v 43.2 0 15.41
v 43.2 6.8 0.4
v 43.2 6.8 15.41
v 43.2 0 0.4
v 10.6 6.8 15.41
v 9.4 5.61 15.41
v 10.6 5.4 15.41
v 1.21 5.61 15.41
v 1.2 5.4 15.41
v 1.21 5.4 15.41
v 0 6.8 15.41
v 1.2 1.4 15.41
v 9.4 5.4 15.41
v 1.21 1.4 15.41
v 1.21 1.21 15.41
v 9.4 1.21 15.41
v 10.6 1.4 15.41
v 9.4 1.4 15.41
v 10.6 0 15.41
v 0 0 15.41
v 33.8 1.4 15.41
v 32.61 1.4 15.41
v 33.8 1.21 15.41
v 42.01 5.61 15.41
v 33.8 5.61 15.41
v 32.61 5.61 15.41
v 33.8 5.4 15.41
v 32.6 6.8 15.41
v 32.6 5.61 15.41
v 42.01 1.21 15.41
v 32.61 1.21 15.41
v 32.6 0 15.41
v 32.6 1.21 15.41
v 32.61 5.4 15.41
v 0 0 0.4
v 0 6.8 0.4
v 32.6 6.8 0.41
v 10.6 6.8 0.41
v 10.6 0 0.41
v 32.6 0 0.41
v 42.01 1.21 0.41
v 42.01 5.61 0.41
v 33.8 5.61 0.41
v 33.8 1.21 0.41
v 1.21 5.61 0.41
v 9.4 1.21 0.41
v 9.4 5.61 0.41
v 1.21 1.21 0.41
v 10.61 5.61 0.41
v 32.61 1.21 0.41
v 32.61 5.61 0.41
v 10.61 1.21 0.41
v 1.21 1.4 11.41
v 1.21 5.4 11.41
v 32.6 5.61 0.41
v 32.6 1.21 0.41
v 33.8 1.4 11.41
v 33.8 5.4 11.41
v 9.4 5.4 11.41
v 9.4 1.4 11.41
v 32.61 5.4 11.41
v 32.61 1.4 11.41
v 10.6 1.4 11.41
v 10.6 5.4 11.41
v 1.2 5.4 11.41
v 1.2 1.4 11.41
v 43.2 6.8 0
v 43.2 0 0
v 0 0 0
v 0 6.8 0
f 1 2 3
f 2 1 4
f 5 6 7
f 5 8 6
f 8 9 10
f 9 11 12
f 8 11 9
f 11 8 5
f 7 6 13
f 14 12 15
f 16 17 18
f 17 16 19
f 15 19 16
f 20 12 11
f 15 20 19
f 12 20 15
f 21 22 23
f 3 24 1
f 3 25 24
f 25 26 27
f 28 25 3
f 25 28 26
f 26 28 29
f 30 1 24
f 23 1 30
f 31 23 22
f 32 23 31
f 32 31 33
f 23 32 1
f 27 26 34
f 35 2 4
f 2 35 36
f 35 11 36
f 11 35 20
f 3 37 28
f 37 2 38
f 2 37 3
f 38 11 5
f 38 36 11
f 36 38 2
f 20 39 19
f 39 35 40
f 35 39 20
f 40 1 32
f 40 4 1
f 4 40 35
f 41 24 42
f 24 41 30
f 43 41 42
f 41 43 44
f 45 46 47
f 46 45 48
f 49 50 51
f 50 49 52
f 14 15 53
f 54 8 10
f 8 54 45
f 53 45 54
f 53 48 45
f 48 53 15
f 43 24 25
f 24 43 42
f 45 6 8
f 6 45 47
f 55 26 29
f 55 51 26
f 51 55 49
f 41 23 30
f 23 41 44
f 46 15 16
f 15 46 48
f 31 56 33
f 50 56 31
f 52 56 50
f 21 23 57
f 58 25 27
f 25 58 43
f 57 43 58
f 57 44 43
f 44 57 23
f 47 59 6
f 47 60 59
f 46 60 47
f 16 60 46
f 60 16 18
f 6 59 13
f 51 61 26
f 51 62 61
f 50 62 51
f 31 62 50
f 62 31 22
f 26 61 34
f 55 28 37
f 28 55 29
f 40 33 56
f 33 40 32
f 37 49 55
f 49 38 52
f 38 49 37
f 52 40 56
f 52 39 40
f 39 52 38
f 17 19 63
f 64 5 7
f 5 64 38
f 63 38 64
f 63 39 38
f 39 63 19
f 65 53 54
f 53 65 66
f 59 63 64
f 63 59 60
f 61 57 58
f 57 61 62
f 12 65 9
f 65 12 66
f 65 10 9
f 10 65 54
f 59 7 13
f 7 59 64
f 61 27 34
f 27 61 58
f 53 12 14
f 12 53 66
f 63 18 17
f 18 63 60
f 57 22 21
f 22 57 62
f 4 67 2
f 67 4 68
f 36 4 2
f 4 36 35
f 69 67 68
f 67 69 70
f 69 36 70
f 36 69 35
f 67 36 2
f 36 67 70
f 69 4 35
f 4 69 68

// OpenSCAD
// file: ../../Base/Rotation.scad
// Fischertechnik Box Foundation
// Geometry Helpers Rotation

include <PlacementOptions.scad>

// getRotatedSpace(space, rotation=NoRotation)
// Rotates the space dependent on the specified rotation

function getRotatedSpace(space, rotation=NoRotation) = [
    (rotation == Rotate90 || rotation == Rotate270) ? space.y : space.x,
    (rotation == Rotate90 || rotation == Rotate270) ? space.x : space.y
];

// Rotates the given space around the fixed left lower corner
// space = the space the children needs as width/depth list [width,depth]
// rotation = 0 Rotate0 degrees, 1 Rotate90 degrees, 2 Rotate180 degrees, 3 Rotate270 degrees (equivalent to -90)

module RotateFix(space, rotation=NoRotation) {
    dy = (rotation == Rotate0 || rotation == Rotate270) ? 0 :
        (rotation == Rotate90) ? space.x :
        space.y;
    dx = (rotation < Rotate180) ? 0 :
        (rotation == Rotate180) ? space.x :
        space.y;
    
    translate([dx, dy, 0])
        rotate([0, 0, rotations[rotation]])
            children();
}
// file: ../../Base/Alignment.scad
// Fischertechnik Box Foundation
// Geometry Helpers Alignment

include <PlacementOptions.scad>

// getAlignedX(elementWidth, spaceWidth, align=AlignRight, offset=0)
// Gets the aligned X offset of an element with the given
// width in the given space.
// elementWidth = The width of the element to positon
// spaceWidth = The space where the element should be aligned
// align = 0 AlignLeft, 1 AlignCenter, 2 AlignRight
// offset = an optional offset from the aligned position. When
// aligned left or centered, then positive values are in X direction.
// When aligned right then positive values are in negative X direction.

function getAlignedX(elementWidth, spaceWidth, align=AlignRight, offset=0) =
    (align == AlignLeft) ?
        offset :
        ((align == AlignCenter) ?
        (spaceWidth - elementWidth)/2 + offset :
        spaceWidth - offset - elementWidth);

// getAlignedY(elementDepth, spaceDepth, align=AlignTop, offset=0)
// Gets the aligned Y offset of an element with the given
// depth in the given space.
// elementDepth = The depth of the element to positon
// spaceDepth = The space where the element should be aligned
// align = 0 AlignBottom, 1 AlignCenter, 2 AlignTop
// offset = an optional offset from the aligned position. When
// aligned bottom or centered, then positive values are in Y direction.
// When aligned top then positive values are in negative Y direction.

function getAlignedY(elementDepth, spaceDepth, align=AlignTop, offset=0) =
    (align == AlignBottom) ?
        offset :
        ((align == AlignCenter) ?
        (spaceDepth - elementDepth)/2 + offset :
        spaceDepth - offset - elementDepth);
// file: ../../Base/Boxes.scad
// Fischertechnik Box Foundation
// Pre-designed Boxes

use <Constants.scad>

include <PlacementOptions.scad>

box190Width = 190;
box190Depth = 130;
box130Width = 130;
box130Depth = 95;

// Values are from an original ec3 box
topBottomDifference = 1.5;
outerHeight = 40;
innerHeight = 38.2;
baseThickness = outerHeight - innerHeight;
stackExcess = 5.7;
radius = 3.5;
wallThickness = 1.5;
tolerance = 0.2;
stackOffset = innerHeight - stackExcess;

boxUsageHeight = stackOffset;
boxWallThickness = wallThickness;
boxBaseThickness = baseThickness;
boxWebWidth = 3.0;

// getBoxWallThickness()
// Gets the wall thickness of a Fischertechnik Box
function getBoxWallThickness() = boxWallThickness;

// getBoxUsageHeight()
// Gets the usable height of a Fischertechnik box
function getBoxUsageHeight() = boxUsageHeight;

// getBoxInnerHeight()
// Gets the inner height of a Fischertechnik box, including the stack excess
function getBoxInnerHeight() = innerHeight;

// getBoxBaseThickness()
// Gets the thickness of the Fischertechnik box base.
function getBoxBaseThickness() = boxBaseThickness;

// getBoxWebWidth()
// Gets the width of a box web
function getBoxWebWidth() = boxWebWidth;

// getBox190Space()
// Gets the usable inner space of a Box 190 as an x/y-list
function getBox190Space() = [
    box190Width - 2*getBoxWallThickness() - topBottomDifference, 
    box190Depth - 2*getBoxWallThickness() - topBottomDifference ];

// RoundedCornerPlate(width, depth, height, radius)
// Creates a body plate with rounded corners for a box. Used
// also to create the complete box with the hull module.
// width = Width of the plate
// depth = depth of the plate 
// height = thickness of the plate
// radius = radius of the rounded corner
module RoundedCornerPlate(width, depth, height, radius) {
    translate([radius, radius])
    hull() {
        w = width-2*radius;
        d = depth-2*radius;
        cube([w, d, height]);
        cylinder(height, r=radius, $fn=getFragments());
        translate([w, 0])
            cylinder(height, r=radius, $fn=getFragments());
        translate([w, d])
            cylinder(height, r=radius, $fn=getFragments());
        translate([0, d])
            cylinder(height, r=radius, $fn=getFragments());
    }
}

// BoxBase(width, depth)
// Creates an empty stackable Fischertechnik compatible box
// width = Outer width of the box (190, 130, ...)
// depth = Outer depth of the box (130, 95, ...)

module BoxBase(width, depth, height=outerHeight) {    
    thinPlate = 0.01;

    innerHeight = height - baseThickness;    
    
    module Body(tolerance=tolerance) {
        hull() {
            // Bottom with tolerance to fit into the original boxes when stacked
            translate([-wallThickness+tolerance, -wallThickness+tolerance, -baseThickness])
                RoundedCornerPlate(width-topBottomDifference-2*tolerance, depth-topBottomDifference-2*tolerance, thinPlate, radius);
            
            // Top
            translate([-wallThickness-topBottomDifference/2, -wallThickness-topBottomDifference/2, innerHeight-thinPlate])
                RoundedCornerPlate(width, depth, thinPlate, radius);
         }
    }

    module Cutoff() {
        hull() {
            coWidth = width - 2*wallThickness;
            coDepth = depth - 2*wallThickness;
            
            // Bottom
            RoundedCornerPlate(coWidth-topBottomDifference, coDepth-topBottomDifference, thinPlate, radius);

            // Top
            translate([-topBottomDifference/2, -topBottomDifference/2, innerHeight+thinPlate]) 
                RoundedCornerPlate(coWidth, coDepth, thinPlate, radius);
        }
    }
    
    difference() {        
        Body();
        Cutoff();
        stackOffset = innerHeight - stackExcess;
        translate([0, 0, stackOffset + baseThickness])
            Body(tolerance=0);
    }
}

// Creates the Fischertechnik empty box 130x190 mm and places it at position 0,0
// 190x130 are the outer sizes, the inner space is slightly smaller. Use getBox190Space() to get the inner sizes.
// The box is positioned that the usable inner space is at the 0,0,0 position.

module Box190() {
    BoxBase(box190Width, box190Depth);
}

// Gets the usable inner space of a Box 130 as an x/y-list
function getBox130Space() = [
    box130Width - 2*getBoxWallThickness() - topBottomDifference, 
    box130Depth - 2*getBoxWallThickness() - topBottomDifference ];

// Creates the Fischertechnik empty box 95x130 mm and places it at position 0,0
// 190x130 are the outer sizes, the inner space is slightly smaller. Use getBox190Space() to get the inner sizes.
// The box is positioned that the usable inner space is at the 0,0,0 position.

module Box130() {
    BoxBase(box130Width, box130Depth);
}

// Creates a web at the specified box walls
// corner 0 = LowerLeft, 1 = UpperLeft, 2 = UpperRight, 3 = LowerRight
// side 0 = LeftOfCorner, 1 = RightOfCorner
// distance = Distance in mm from the corner
// boxSpace = inner width and depth of the box (default: Box 190)
// webWidth = length of the web (default is 3 mms)
// webThickness = thickness of the web (default is 1 mm)

module BoxWeb(corner, side, distance, boxSpace=getBox190Space(), webWidth=getBoxWebWidth(), webThickness=1.0) {
    sink = getBoxWallThickness()/2;

    width = (corner % 2 == 0) ? 
            (side == LeftOfCorner ? webWidth : webThickness) :
            (side == LeftOfCorner ? webThickness : webWidth);

    depth = (corner % 2 == 0) ? 
            (side == RightOfCorner ? webWidth : webThickness) :
            (side == RightOfCorner ? webThickness : webWidth);
    
    xDiff = corner == LowerLeft ? 
                (side == LeftOfCorner ? -sink : distance) :
            (corner == UpperLeft ?                
                (side == LeftOfCorner ? distance : -sink) :
            (corner == UpperRight ?
                (side == LeftOfCorner ? boxSpace.x-webWidth+sink : boxSpace.x-distance-webThickness) :
                (side == LeftOfCorner ? boxSpace.x-distance-webThickness: boxSpace.x-webWidth+sink)));

    yDiff = corner == LowerLeft ? 
                (side == RightOfCorner ? -sink : distance) :
            (corner == UpperLeft ?
                (side == RightOfCorner ? boxSpace.y-distance : boxSpace.y-webWidth+sink) :
            (corner == UpperRight ?
                (side == RightOfCorner ? boxSpace.y-webWidth+sink : boxSpace.y-distance) :
                (side == RightOfCorner ? distance : -sink)));
    
    translate([xDiff, yDiff, -getExcess()])
        cube([width, depth, boxUsageHeight + 2*getExcess()]);
}
// file: ../../Base/PlacementOptions.scad
// Fischertechnik Box Foundation
// Placement Options

// Alignment
NoAlign = 0;
AlignLeft = 1;
AlignBottom = 2;
AlignCenter = 3;
AlignRight = 4;
AlignTop = 5;

// Element rotation degree steps
rotations = [0, -90, -180, -270];

// Rotation
NoRotation = 0;
Rotate0 = 0;
Rotate90 = 1;
Rotate180 = 2;
Rotate270 = 3;

// Docking (seen from above)
NoDock = -1;
DockLeft = 0;
DockTop = 1;
DockRight = 2;
DockCorner = 2;
DockBottom = 3;

// Web corners
LowerLeft = 0;
UpperLeft = 1;
UpperRight = 2;
LowerRight = 3;

// Web position relative to corner
LeftOfCorner = 0;
RightOfCorner = 1;
// file: ../../Base/Placement.scad
// Fischertechnik Box Foundation
// Geometry Helpers Placement

use <Constants.scad>
use <Alignment.scad>
use <Rotation.scad>
use <Boxes.scad>

include <PlacementOptions.scad>

// Place(x=0, y=0, elementSpace=[0,0], alignX=AlignLeft, alignY=AlignBottom, rotation=Rotate0, boxSpace=getBox190Space())
// Places the child at the specified position
// y = Y-Position. This is a relative position when an X aligment is specified.
// x = X-Position. This is a relative position when an Y aligment is specified.
// elementSpace = space of the element to be placed [x,y]
// alignX = -1=NoAlign, 0 AlignLeft, 1 AlignCenter, 3 AlignRight (elementSpace and boxSpace required!)
// alignY = -1=NoAlign, 2 AlignBottom, 1 AlignCenter, 4 AlignTop (elementSpace and boxSpace required!)
// rotation = 0 Rotate0 0 degrees, 1 Rotate90 90 degrees, 
// 2 Rotate180 180 degrees, 3 Rotate270 270 degrees (equivalent to -90)
// boxSpace = Inner space of the box where the placement occurs [x,y] - default is Box 190x130 inner space

module Place(x=0, y=0, elementSpace=[0,0], 
  alignX=AlignLeft, alignY=AlignBottom, 
  rotation=NoRotation, boxSpace=getBox190Space()) {

    module Position(x, y, space, rotation=Rotate0) {
        translate([x, y, 0])
            RotateFix(space, rotation)
                children();
    }

    space = getRotatedSpace(elementSpace, rotation);
    alignedX = getAlignedX(space.x, boxSpace.x, alignX, x);
    alignedY = getAlignedY(space.y, boxSpace.y, alignY, y);
    Position(alignedX, alignedY, elementSpace, rotation)
        children();
}

// Center(space=getBox130Space(), elementSpace=[0,0])
// space = Space where the children is centered. For cylinder use centered=true and no elementSpace.
// elementSpace = space of the element to be centered [x,y]

module Center(space=getBox190Space(), elementSpace=[0,0]) {
    Place(elementSpace=elementSpace, boxSpace=space, alignX=AlignCenter, alignY=AlignCenter)
        children();
}

// CenterHorizontal(width=0, y=0, offset=0, space=getBox130Space())
// width = Width of the element to be placed.
// y = Y position of the element
// offset = Offset from the center position (negative will be left of the center)
// space = Space where the element is placed

module CenterHorizontal(width=0, y=0, offset=0, space=getBox190Space()) {
    Place(x=offset, y=y, elementSpace=[width, 0], boxSpace=space, alignX=AlignCenter)
        children(0);
}

// CenterVertical(depth=0, x=0, offset=0, space=getBox130Space())
// depth = Depth of the element to be placed.
// x = X position of the element
// offset = Offset from the center position (negative will be down of the center)
// space = Space where the element is placed

module CenterVertical(depth=0, x=0, offset=0, space=getBox190Space()) {
    Place(x=x, y=offset, elementSpace=[0, depth], boxSpace=space, alignY=AlignCenter)
        children(0);
}

// getIsVertical(align)
// True if the specified alignment needs a vertical orientation for a divider (AlignRight, AlignLeft)

function getIsVertical(align) = (align == AlignRight || align == AlignLeft);

// getIsHorizontal(align)
// True if the specified alignment needs a horizontal orientation for a divider (AlignTop, AlignBottom)

function getIsHorizontal(align) = (align == AlignTop || align == AlignBottom);
// file: ../../Elements/AxisClip10.scad
// Fischertechnik Box Library
// Axis for clip 10
// 31023

use <../ModelBase/Simple.scad>
use <../Base/Constants.scad>

/* [Element Parameters] */
height = 23;
clipHeight = 10;

/* [Hidden] */
width = 12;
depth = 12;
upperDiameter = 3.6;

// getAxisClip10Space()
// Gets the space of a n axis for a clip 10 with spring ring (mot2)

function getAxisClip10Space() = [width, depth, height];

// AxisClip10(height, clipHeight)
// Axis for clip 10 with spring ring (mot2)
// height = Height of the complete axis (standard is 23, in mot3 its only 12)
// clipHeight = Height of the part for the clip (standard is 10, in mot3 its only 7)

module AxisClip10(height=height, clipHeight=clipHeight) {
    LeveledAxisWithSpace(height, height-clipHeight, getAxisClip10Space(), diameter=upperDiameter);
}

// Test
color("lightgray")
AxisClip10(height, clipHeight);
// file: ../../Base/Constants.scad
// Fischertechnik Box Foundation
// Constants

// Constant values necessary for multiple elements

// Base constants
dividerThickness = 1.2;
excess = 0.01;
fragments = 90;
tolerance = 0.8;

// Gets the thickness of a divider 
function getDividerThickness() = dividerThickness;

// Gets the excess that is used to merge walls into each other
function getExcess() = excess;

// Gets amount of fragments of a cylinder
function getFragments() = fragments;

// Gets the inner tolerance of a frame to each side
function getTolerance() = tolerance;


// Fischertechnik specific constants
axisDiameter = 4;
axisBottomDiameter = axisDiameter + 1;
axisTolerance = 0.2;

// Gets axis diameter of Fischertechnik axis
function getAxisDiameter() = axisDiameter;

// Gets axis diameter tolerance (subtracted for element axis)
function getAxisTolerance() = axisTolerance;

// Gets the axis diameter for standing axis
function getStandAxisDiameter() = getAxisDiameter() - getAxisTolerance();

// Gets axis bottom diameter for thicker part at the bottom
function getAxisBottomDiameter() = axisBottomDiameter;

standardEdgeDistance = 2.5;
standardWebDistance = 11.5;
standardCornerLength = 15;

// gets the standard distance to the wall of the box for dockable frames with webs
function getStandardEdgeDistance() = standardEdgeDistance;

// gets the standard distance of each web to the corner of the dockable frame
function getStandardWebDistance() = standardWebDistance;

// gets the standard length of the corner walls of a dockable frame
function getStandardCornerLength() = standardCornerLength;

tubeWallFactor = 0.8;

// gets the wall thickness of a tube.
function getTubeWallThickness() = tubeWallFactor * getDividerThickness();

smallPartsFrameHeight = 20;

// gets the frame height for docked small parts boxes.
function getSmallPartsFrameHeight() = smallPartsFrameHeight;

hubRingDiameter = 19.5;
hubRingLevelDiameter = 21;

// gets the diameter of a tube matching the inner ring of a wheel
function getHubRingDiameter() = hubRingDiameter;

// gets the diameter of a hub tube with a thicker diameter
function getHubRingLevelDiameter() = hubRingLevelDiameter;
// file: ../../Elements/FrameAxis40.scad
// Fischertechnik Box Library
// Frame for single 40 mm Axis (with Z28)
// 31064

use <../ModelBase/Complex.scad>

length = 40;

// getFrameAxis40Space()
// Gets the width (.x) and depth (.y) of the axis frame.

function getFrameAxis40Space() = getFrameAxisSpace(length);

// FrameAxis40()
// Axis holder for a single 50 mm axis.

module FrameAxis40() {
    FrameAxis(length);
}

// Test
color("lightgray")
FrameAxis40();
// file: ../TestPrint.scad
// 3D Print Test Base

use <../Base/Constants.scad>

use <../Elements/AxisClip10.scad>

module TestPrint(elementSpace) {
    cube([elementSpace.x, elementSpace.y, 0.4]);
    translate([0,0,0.4+getExcess()]) {
        children();
    }
}

TestPrint(getAxisClip10Space())
    AxisClip10();
// main file
// 3D Print Test
// FrameAxis40

use <../TestPrint.scad>
use <../../Elements/FrameAxis40.scad>

TestPrint(getFrameAxis40Space())
    FrameAxis40();
